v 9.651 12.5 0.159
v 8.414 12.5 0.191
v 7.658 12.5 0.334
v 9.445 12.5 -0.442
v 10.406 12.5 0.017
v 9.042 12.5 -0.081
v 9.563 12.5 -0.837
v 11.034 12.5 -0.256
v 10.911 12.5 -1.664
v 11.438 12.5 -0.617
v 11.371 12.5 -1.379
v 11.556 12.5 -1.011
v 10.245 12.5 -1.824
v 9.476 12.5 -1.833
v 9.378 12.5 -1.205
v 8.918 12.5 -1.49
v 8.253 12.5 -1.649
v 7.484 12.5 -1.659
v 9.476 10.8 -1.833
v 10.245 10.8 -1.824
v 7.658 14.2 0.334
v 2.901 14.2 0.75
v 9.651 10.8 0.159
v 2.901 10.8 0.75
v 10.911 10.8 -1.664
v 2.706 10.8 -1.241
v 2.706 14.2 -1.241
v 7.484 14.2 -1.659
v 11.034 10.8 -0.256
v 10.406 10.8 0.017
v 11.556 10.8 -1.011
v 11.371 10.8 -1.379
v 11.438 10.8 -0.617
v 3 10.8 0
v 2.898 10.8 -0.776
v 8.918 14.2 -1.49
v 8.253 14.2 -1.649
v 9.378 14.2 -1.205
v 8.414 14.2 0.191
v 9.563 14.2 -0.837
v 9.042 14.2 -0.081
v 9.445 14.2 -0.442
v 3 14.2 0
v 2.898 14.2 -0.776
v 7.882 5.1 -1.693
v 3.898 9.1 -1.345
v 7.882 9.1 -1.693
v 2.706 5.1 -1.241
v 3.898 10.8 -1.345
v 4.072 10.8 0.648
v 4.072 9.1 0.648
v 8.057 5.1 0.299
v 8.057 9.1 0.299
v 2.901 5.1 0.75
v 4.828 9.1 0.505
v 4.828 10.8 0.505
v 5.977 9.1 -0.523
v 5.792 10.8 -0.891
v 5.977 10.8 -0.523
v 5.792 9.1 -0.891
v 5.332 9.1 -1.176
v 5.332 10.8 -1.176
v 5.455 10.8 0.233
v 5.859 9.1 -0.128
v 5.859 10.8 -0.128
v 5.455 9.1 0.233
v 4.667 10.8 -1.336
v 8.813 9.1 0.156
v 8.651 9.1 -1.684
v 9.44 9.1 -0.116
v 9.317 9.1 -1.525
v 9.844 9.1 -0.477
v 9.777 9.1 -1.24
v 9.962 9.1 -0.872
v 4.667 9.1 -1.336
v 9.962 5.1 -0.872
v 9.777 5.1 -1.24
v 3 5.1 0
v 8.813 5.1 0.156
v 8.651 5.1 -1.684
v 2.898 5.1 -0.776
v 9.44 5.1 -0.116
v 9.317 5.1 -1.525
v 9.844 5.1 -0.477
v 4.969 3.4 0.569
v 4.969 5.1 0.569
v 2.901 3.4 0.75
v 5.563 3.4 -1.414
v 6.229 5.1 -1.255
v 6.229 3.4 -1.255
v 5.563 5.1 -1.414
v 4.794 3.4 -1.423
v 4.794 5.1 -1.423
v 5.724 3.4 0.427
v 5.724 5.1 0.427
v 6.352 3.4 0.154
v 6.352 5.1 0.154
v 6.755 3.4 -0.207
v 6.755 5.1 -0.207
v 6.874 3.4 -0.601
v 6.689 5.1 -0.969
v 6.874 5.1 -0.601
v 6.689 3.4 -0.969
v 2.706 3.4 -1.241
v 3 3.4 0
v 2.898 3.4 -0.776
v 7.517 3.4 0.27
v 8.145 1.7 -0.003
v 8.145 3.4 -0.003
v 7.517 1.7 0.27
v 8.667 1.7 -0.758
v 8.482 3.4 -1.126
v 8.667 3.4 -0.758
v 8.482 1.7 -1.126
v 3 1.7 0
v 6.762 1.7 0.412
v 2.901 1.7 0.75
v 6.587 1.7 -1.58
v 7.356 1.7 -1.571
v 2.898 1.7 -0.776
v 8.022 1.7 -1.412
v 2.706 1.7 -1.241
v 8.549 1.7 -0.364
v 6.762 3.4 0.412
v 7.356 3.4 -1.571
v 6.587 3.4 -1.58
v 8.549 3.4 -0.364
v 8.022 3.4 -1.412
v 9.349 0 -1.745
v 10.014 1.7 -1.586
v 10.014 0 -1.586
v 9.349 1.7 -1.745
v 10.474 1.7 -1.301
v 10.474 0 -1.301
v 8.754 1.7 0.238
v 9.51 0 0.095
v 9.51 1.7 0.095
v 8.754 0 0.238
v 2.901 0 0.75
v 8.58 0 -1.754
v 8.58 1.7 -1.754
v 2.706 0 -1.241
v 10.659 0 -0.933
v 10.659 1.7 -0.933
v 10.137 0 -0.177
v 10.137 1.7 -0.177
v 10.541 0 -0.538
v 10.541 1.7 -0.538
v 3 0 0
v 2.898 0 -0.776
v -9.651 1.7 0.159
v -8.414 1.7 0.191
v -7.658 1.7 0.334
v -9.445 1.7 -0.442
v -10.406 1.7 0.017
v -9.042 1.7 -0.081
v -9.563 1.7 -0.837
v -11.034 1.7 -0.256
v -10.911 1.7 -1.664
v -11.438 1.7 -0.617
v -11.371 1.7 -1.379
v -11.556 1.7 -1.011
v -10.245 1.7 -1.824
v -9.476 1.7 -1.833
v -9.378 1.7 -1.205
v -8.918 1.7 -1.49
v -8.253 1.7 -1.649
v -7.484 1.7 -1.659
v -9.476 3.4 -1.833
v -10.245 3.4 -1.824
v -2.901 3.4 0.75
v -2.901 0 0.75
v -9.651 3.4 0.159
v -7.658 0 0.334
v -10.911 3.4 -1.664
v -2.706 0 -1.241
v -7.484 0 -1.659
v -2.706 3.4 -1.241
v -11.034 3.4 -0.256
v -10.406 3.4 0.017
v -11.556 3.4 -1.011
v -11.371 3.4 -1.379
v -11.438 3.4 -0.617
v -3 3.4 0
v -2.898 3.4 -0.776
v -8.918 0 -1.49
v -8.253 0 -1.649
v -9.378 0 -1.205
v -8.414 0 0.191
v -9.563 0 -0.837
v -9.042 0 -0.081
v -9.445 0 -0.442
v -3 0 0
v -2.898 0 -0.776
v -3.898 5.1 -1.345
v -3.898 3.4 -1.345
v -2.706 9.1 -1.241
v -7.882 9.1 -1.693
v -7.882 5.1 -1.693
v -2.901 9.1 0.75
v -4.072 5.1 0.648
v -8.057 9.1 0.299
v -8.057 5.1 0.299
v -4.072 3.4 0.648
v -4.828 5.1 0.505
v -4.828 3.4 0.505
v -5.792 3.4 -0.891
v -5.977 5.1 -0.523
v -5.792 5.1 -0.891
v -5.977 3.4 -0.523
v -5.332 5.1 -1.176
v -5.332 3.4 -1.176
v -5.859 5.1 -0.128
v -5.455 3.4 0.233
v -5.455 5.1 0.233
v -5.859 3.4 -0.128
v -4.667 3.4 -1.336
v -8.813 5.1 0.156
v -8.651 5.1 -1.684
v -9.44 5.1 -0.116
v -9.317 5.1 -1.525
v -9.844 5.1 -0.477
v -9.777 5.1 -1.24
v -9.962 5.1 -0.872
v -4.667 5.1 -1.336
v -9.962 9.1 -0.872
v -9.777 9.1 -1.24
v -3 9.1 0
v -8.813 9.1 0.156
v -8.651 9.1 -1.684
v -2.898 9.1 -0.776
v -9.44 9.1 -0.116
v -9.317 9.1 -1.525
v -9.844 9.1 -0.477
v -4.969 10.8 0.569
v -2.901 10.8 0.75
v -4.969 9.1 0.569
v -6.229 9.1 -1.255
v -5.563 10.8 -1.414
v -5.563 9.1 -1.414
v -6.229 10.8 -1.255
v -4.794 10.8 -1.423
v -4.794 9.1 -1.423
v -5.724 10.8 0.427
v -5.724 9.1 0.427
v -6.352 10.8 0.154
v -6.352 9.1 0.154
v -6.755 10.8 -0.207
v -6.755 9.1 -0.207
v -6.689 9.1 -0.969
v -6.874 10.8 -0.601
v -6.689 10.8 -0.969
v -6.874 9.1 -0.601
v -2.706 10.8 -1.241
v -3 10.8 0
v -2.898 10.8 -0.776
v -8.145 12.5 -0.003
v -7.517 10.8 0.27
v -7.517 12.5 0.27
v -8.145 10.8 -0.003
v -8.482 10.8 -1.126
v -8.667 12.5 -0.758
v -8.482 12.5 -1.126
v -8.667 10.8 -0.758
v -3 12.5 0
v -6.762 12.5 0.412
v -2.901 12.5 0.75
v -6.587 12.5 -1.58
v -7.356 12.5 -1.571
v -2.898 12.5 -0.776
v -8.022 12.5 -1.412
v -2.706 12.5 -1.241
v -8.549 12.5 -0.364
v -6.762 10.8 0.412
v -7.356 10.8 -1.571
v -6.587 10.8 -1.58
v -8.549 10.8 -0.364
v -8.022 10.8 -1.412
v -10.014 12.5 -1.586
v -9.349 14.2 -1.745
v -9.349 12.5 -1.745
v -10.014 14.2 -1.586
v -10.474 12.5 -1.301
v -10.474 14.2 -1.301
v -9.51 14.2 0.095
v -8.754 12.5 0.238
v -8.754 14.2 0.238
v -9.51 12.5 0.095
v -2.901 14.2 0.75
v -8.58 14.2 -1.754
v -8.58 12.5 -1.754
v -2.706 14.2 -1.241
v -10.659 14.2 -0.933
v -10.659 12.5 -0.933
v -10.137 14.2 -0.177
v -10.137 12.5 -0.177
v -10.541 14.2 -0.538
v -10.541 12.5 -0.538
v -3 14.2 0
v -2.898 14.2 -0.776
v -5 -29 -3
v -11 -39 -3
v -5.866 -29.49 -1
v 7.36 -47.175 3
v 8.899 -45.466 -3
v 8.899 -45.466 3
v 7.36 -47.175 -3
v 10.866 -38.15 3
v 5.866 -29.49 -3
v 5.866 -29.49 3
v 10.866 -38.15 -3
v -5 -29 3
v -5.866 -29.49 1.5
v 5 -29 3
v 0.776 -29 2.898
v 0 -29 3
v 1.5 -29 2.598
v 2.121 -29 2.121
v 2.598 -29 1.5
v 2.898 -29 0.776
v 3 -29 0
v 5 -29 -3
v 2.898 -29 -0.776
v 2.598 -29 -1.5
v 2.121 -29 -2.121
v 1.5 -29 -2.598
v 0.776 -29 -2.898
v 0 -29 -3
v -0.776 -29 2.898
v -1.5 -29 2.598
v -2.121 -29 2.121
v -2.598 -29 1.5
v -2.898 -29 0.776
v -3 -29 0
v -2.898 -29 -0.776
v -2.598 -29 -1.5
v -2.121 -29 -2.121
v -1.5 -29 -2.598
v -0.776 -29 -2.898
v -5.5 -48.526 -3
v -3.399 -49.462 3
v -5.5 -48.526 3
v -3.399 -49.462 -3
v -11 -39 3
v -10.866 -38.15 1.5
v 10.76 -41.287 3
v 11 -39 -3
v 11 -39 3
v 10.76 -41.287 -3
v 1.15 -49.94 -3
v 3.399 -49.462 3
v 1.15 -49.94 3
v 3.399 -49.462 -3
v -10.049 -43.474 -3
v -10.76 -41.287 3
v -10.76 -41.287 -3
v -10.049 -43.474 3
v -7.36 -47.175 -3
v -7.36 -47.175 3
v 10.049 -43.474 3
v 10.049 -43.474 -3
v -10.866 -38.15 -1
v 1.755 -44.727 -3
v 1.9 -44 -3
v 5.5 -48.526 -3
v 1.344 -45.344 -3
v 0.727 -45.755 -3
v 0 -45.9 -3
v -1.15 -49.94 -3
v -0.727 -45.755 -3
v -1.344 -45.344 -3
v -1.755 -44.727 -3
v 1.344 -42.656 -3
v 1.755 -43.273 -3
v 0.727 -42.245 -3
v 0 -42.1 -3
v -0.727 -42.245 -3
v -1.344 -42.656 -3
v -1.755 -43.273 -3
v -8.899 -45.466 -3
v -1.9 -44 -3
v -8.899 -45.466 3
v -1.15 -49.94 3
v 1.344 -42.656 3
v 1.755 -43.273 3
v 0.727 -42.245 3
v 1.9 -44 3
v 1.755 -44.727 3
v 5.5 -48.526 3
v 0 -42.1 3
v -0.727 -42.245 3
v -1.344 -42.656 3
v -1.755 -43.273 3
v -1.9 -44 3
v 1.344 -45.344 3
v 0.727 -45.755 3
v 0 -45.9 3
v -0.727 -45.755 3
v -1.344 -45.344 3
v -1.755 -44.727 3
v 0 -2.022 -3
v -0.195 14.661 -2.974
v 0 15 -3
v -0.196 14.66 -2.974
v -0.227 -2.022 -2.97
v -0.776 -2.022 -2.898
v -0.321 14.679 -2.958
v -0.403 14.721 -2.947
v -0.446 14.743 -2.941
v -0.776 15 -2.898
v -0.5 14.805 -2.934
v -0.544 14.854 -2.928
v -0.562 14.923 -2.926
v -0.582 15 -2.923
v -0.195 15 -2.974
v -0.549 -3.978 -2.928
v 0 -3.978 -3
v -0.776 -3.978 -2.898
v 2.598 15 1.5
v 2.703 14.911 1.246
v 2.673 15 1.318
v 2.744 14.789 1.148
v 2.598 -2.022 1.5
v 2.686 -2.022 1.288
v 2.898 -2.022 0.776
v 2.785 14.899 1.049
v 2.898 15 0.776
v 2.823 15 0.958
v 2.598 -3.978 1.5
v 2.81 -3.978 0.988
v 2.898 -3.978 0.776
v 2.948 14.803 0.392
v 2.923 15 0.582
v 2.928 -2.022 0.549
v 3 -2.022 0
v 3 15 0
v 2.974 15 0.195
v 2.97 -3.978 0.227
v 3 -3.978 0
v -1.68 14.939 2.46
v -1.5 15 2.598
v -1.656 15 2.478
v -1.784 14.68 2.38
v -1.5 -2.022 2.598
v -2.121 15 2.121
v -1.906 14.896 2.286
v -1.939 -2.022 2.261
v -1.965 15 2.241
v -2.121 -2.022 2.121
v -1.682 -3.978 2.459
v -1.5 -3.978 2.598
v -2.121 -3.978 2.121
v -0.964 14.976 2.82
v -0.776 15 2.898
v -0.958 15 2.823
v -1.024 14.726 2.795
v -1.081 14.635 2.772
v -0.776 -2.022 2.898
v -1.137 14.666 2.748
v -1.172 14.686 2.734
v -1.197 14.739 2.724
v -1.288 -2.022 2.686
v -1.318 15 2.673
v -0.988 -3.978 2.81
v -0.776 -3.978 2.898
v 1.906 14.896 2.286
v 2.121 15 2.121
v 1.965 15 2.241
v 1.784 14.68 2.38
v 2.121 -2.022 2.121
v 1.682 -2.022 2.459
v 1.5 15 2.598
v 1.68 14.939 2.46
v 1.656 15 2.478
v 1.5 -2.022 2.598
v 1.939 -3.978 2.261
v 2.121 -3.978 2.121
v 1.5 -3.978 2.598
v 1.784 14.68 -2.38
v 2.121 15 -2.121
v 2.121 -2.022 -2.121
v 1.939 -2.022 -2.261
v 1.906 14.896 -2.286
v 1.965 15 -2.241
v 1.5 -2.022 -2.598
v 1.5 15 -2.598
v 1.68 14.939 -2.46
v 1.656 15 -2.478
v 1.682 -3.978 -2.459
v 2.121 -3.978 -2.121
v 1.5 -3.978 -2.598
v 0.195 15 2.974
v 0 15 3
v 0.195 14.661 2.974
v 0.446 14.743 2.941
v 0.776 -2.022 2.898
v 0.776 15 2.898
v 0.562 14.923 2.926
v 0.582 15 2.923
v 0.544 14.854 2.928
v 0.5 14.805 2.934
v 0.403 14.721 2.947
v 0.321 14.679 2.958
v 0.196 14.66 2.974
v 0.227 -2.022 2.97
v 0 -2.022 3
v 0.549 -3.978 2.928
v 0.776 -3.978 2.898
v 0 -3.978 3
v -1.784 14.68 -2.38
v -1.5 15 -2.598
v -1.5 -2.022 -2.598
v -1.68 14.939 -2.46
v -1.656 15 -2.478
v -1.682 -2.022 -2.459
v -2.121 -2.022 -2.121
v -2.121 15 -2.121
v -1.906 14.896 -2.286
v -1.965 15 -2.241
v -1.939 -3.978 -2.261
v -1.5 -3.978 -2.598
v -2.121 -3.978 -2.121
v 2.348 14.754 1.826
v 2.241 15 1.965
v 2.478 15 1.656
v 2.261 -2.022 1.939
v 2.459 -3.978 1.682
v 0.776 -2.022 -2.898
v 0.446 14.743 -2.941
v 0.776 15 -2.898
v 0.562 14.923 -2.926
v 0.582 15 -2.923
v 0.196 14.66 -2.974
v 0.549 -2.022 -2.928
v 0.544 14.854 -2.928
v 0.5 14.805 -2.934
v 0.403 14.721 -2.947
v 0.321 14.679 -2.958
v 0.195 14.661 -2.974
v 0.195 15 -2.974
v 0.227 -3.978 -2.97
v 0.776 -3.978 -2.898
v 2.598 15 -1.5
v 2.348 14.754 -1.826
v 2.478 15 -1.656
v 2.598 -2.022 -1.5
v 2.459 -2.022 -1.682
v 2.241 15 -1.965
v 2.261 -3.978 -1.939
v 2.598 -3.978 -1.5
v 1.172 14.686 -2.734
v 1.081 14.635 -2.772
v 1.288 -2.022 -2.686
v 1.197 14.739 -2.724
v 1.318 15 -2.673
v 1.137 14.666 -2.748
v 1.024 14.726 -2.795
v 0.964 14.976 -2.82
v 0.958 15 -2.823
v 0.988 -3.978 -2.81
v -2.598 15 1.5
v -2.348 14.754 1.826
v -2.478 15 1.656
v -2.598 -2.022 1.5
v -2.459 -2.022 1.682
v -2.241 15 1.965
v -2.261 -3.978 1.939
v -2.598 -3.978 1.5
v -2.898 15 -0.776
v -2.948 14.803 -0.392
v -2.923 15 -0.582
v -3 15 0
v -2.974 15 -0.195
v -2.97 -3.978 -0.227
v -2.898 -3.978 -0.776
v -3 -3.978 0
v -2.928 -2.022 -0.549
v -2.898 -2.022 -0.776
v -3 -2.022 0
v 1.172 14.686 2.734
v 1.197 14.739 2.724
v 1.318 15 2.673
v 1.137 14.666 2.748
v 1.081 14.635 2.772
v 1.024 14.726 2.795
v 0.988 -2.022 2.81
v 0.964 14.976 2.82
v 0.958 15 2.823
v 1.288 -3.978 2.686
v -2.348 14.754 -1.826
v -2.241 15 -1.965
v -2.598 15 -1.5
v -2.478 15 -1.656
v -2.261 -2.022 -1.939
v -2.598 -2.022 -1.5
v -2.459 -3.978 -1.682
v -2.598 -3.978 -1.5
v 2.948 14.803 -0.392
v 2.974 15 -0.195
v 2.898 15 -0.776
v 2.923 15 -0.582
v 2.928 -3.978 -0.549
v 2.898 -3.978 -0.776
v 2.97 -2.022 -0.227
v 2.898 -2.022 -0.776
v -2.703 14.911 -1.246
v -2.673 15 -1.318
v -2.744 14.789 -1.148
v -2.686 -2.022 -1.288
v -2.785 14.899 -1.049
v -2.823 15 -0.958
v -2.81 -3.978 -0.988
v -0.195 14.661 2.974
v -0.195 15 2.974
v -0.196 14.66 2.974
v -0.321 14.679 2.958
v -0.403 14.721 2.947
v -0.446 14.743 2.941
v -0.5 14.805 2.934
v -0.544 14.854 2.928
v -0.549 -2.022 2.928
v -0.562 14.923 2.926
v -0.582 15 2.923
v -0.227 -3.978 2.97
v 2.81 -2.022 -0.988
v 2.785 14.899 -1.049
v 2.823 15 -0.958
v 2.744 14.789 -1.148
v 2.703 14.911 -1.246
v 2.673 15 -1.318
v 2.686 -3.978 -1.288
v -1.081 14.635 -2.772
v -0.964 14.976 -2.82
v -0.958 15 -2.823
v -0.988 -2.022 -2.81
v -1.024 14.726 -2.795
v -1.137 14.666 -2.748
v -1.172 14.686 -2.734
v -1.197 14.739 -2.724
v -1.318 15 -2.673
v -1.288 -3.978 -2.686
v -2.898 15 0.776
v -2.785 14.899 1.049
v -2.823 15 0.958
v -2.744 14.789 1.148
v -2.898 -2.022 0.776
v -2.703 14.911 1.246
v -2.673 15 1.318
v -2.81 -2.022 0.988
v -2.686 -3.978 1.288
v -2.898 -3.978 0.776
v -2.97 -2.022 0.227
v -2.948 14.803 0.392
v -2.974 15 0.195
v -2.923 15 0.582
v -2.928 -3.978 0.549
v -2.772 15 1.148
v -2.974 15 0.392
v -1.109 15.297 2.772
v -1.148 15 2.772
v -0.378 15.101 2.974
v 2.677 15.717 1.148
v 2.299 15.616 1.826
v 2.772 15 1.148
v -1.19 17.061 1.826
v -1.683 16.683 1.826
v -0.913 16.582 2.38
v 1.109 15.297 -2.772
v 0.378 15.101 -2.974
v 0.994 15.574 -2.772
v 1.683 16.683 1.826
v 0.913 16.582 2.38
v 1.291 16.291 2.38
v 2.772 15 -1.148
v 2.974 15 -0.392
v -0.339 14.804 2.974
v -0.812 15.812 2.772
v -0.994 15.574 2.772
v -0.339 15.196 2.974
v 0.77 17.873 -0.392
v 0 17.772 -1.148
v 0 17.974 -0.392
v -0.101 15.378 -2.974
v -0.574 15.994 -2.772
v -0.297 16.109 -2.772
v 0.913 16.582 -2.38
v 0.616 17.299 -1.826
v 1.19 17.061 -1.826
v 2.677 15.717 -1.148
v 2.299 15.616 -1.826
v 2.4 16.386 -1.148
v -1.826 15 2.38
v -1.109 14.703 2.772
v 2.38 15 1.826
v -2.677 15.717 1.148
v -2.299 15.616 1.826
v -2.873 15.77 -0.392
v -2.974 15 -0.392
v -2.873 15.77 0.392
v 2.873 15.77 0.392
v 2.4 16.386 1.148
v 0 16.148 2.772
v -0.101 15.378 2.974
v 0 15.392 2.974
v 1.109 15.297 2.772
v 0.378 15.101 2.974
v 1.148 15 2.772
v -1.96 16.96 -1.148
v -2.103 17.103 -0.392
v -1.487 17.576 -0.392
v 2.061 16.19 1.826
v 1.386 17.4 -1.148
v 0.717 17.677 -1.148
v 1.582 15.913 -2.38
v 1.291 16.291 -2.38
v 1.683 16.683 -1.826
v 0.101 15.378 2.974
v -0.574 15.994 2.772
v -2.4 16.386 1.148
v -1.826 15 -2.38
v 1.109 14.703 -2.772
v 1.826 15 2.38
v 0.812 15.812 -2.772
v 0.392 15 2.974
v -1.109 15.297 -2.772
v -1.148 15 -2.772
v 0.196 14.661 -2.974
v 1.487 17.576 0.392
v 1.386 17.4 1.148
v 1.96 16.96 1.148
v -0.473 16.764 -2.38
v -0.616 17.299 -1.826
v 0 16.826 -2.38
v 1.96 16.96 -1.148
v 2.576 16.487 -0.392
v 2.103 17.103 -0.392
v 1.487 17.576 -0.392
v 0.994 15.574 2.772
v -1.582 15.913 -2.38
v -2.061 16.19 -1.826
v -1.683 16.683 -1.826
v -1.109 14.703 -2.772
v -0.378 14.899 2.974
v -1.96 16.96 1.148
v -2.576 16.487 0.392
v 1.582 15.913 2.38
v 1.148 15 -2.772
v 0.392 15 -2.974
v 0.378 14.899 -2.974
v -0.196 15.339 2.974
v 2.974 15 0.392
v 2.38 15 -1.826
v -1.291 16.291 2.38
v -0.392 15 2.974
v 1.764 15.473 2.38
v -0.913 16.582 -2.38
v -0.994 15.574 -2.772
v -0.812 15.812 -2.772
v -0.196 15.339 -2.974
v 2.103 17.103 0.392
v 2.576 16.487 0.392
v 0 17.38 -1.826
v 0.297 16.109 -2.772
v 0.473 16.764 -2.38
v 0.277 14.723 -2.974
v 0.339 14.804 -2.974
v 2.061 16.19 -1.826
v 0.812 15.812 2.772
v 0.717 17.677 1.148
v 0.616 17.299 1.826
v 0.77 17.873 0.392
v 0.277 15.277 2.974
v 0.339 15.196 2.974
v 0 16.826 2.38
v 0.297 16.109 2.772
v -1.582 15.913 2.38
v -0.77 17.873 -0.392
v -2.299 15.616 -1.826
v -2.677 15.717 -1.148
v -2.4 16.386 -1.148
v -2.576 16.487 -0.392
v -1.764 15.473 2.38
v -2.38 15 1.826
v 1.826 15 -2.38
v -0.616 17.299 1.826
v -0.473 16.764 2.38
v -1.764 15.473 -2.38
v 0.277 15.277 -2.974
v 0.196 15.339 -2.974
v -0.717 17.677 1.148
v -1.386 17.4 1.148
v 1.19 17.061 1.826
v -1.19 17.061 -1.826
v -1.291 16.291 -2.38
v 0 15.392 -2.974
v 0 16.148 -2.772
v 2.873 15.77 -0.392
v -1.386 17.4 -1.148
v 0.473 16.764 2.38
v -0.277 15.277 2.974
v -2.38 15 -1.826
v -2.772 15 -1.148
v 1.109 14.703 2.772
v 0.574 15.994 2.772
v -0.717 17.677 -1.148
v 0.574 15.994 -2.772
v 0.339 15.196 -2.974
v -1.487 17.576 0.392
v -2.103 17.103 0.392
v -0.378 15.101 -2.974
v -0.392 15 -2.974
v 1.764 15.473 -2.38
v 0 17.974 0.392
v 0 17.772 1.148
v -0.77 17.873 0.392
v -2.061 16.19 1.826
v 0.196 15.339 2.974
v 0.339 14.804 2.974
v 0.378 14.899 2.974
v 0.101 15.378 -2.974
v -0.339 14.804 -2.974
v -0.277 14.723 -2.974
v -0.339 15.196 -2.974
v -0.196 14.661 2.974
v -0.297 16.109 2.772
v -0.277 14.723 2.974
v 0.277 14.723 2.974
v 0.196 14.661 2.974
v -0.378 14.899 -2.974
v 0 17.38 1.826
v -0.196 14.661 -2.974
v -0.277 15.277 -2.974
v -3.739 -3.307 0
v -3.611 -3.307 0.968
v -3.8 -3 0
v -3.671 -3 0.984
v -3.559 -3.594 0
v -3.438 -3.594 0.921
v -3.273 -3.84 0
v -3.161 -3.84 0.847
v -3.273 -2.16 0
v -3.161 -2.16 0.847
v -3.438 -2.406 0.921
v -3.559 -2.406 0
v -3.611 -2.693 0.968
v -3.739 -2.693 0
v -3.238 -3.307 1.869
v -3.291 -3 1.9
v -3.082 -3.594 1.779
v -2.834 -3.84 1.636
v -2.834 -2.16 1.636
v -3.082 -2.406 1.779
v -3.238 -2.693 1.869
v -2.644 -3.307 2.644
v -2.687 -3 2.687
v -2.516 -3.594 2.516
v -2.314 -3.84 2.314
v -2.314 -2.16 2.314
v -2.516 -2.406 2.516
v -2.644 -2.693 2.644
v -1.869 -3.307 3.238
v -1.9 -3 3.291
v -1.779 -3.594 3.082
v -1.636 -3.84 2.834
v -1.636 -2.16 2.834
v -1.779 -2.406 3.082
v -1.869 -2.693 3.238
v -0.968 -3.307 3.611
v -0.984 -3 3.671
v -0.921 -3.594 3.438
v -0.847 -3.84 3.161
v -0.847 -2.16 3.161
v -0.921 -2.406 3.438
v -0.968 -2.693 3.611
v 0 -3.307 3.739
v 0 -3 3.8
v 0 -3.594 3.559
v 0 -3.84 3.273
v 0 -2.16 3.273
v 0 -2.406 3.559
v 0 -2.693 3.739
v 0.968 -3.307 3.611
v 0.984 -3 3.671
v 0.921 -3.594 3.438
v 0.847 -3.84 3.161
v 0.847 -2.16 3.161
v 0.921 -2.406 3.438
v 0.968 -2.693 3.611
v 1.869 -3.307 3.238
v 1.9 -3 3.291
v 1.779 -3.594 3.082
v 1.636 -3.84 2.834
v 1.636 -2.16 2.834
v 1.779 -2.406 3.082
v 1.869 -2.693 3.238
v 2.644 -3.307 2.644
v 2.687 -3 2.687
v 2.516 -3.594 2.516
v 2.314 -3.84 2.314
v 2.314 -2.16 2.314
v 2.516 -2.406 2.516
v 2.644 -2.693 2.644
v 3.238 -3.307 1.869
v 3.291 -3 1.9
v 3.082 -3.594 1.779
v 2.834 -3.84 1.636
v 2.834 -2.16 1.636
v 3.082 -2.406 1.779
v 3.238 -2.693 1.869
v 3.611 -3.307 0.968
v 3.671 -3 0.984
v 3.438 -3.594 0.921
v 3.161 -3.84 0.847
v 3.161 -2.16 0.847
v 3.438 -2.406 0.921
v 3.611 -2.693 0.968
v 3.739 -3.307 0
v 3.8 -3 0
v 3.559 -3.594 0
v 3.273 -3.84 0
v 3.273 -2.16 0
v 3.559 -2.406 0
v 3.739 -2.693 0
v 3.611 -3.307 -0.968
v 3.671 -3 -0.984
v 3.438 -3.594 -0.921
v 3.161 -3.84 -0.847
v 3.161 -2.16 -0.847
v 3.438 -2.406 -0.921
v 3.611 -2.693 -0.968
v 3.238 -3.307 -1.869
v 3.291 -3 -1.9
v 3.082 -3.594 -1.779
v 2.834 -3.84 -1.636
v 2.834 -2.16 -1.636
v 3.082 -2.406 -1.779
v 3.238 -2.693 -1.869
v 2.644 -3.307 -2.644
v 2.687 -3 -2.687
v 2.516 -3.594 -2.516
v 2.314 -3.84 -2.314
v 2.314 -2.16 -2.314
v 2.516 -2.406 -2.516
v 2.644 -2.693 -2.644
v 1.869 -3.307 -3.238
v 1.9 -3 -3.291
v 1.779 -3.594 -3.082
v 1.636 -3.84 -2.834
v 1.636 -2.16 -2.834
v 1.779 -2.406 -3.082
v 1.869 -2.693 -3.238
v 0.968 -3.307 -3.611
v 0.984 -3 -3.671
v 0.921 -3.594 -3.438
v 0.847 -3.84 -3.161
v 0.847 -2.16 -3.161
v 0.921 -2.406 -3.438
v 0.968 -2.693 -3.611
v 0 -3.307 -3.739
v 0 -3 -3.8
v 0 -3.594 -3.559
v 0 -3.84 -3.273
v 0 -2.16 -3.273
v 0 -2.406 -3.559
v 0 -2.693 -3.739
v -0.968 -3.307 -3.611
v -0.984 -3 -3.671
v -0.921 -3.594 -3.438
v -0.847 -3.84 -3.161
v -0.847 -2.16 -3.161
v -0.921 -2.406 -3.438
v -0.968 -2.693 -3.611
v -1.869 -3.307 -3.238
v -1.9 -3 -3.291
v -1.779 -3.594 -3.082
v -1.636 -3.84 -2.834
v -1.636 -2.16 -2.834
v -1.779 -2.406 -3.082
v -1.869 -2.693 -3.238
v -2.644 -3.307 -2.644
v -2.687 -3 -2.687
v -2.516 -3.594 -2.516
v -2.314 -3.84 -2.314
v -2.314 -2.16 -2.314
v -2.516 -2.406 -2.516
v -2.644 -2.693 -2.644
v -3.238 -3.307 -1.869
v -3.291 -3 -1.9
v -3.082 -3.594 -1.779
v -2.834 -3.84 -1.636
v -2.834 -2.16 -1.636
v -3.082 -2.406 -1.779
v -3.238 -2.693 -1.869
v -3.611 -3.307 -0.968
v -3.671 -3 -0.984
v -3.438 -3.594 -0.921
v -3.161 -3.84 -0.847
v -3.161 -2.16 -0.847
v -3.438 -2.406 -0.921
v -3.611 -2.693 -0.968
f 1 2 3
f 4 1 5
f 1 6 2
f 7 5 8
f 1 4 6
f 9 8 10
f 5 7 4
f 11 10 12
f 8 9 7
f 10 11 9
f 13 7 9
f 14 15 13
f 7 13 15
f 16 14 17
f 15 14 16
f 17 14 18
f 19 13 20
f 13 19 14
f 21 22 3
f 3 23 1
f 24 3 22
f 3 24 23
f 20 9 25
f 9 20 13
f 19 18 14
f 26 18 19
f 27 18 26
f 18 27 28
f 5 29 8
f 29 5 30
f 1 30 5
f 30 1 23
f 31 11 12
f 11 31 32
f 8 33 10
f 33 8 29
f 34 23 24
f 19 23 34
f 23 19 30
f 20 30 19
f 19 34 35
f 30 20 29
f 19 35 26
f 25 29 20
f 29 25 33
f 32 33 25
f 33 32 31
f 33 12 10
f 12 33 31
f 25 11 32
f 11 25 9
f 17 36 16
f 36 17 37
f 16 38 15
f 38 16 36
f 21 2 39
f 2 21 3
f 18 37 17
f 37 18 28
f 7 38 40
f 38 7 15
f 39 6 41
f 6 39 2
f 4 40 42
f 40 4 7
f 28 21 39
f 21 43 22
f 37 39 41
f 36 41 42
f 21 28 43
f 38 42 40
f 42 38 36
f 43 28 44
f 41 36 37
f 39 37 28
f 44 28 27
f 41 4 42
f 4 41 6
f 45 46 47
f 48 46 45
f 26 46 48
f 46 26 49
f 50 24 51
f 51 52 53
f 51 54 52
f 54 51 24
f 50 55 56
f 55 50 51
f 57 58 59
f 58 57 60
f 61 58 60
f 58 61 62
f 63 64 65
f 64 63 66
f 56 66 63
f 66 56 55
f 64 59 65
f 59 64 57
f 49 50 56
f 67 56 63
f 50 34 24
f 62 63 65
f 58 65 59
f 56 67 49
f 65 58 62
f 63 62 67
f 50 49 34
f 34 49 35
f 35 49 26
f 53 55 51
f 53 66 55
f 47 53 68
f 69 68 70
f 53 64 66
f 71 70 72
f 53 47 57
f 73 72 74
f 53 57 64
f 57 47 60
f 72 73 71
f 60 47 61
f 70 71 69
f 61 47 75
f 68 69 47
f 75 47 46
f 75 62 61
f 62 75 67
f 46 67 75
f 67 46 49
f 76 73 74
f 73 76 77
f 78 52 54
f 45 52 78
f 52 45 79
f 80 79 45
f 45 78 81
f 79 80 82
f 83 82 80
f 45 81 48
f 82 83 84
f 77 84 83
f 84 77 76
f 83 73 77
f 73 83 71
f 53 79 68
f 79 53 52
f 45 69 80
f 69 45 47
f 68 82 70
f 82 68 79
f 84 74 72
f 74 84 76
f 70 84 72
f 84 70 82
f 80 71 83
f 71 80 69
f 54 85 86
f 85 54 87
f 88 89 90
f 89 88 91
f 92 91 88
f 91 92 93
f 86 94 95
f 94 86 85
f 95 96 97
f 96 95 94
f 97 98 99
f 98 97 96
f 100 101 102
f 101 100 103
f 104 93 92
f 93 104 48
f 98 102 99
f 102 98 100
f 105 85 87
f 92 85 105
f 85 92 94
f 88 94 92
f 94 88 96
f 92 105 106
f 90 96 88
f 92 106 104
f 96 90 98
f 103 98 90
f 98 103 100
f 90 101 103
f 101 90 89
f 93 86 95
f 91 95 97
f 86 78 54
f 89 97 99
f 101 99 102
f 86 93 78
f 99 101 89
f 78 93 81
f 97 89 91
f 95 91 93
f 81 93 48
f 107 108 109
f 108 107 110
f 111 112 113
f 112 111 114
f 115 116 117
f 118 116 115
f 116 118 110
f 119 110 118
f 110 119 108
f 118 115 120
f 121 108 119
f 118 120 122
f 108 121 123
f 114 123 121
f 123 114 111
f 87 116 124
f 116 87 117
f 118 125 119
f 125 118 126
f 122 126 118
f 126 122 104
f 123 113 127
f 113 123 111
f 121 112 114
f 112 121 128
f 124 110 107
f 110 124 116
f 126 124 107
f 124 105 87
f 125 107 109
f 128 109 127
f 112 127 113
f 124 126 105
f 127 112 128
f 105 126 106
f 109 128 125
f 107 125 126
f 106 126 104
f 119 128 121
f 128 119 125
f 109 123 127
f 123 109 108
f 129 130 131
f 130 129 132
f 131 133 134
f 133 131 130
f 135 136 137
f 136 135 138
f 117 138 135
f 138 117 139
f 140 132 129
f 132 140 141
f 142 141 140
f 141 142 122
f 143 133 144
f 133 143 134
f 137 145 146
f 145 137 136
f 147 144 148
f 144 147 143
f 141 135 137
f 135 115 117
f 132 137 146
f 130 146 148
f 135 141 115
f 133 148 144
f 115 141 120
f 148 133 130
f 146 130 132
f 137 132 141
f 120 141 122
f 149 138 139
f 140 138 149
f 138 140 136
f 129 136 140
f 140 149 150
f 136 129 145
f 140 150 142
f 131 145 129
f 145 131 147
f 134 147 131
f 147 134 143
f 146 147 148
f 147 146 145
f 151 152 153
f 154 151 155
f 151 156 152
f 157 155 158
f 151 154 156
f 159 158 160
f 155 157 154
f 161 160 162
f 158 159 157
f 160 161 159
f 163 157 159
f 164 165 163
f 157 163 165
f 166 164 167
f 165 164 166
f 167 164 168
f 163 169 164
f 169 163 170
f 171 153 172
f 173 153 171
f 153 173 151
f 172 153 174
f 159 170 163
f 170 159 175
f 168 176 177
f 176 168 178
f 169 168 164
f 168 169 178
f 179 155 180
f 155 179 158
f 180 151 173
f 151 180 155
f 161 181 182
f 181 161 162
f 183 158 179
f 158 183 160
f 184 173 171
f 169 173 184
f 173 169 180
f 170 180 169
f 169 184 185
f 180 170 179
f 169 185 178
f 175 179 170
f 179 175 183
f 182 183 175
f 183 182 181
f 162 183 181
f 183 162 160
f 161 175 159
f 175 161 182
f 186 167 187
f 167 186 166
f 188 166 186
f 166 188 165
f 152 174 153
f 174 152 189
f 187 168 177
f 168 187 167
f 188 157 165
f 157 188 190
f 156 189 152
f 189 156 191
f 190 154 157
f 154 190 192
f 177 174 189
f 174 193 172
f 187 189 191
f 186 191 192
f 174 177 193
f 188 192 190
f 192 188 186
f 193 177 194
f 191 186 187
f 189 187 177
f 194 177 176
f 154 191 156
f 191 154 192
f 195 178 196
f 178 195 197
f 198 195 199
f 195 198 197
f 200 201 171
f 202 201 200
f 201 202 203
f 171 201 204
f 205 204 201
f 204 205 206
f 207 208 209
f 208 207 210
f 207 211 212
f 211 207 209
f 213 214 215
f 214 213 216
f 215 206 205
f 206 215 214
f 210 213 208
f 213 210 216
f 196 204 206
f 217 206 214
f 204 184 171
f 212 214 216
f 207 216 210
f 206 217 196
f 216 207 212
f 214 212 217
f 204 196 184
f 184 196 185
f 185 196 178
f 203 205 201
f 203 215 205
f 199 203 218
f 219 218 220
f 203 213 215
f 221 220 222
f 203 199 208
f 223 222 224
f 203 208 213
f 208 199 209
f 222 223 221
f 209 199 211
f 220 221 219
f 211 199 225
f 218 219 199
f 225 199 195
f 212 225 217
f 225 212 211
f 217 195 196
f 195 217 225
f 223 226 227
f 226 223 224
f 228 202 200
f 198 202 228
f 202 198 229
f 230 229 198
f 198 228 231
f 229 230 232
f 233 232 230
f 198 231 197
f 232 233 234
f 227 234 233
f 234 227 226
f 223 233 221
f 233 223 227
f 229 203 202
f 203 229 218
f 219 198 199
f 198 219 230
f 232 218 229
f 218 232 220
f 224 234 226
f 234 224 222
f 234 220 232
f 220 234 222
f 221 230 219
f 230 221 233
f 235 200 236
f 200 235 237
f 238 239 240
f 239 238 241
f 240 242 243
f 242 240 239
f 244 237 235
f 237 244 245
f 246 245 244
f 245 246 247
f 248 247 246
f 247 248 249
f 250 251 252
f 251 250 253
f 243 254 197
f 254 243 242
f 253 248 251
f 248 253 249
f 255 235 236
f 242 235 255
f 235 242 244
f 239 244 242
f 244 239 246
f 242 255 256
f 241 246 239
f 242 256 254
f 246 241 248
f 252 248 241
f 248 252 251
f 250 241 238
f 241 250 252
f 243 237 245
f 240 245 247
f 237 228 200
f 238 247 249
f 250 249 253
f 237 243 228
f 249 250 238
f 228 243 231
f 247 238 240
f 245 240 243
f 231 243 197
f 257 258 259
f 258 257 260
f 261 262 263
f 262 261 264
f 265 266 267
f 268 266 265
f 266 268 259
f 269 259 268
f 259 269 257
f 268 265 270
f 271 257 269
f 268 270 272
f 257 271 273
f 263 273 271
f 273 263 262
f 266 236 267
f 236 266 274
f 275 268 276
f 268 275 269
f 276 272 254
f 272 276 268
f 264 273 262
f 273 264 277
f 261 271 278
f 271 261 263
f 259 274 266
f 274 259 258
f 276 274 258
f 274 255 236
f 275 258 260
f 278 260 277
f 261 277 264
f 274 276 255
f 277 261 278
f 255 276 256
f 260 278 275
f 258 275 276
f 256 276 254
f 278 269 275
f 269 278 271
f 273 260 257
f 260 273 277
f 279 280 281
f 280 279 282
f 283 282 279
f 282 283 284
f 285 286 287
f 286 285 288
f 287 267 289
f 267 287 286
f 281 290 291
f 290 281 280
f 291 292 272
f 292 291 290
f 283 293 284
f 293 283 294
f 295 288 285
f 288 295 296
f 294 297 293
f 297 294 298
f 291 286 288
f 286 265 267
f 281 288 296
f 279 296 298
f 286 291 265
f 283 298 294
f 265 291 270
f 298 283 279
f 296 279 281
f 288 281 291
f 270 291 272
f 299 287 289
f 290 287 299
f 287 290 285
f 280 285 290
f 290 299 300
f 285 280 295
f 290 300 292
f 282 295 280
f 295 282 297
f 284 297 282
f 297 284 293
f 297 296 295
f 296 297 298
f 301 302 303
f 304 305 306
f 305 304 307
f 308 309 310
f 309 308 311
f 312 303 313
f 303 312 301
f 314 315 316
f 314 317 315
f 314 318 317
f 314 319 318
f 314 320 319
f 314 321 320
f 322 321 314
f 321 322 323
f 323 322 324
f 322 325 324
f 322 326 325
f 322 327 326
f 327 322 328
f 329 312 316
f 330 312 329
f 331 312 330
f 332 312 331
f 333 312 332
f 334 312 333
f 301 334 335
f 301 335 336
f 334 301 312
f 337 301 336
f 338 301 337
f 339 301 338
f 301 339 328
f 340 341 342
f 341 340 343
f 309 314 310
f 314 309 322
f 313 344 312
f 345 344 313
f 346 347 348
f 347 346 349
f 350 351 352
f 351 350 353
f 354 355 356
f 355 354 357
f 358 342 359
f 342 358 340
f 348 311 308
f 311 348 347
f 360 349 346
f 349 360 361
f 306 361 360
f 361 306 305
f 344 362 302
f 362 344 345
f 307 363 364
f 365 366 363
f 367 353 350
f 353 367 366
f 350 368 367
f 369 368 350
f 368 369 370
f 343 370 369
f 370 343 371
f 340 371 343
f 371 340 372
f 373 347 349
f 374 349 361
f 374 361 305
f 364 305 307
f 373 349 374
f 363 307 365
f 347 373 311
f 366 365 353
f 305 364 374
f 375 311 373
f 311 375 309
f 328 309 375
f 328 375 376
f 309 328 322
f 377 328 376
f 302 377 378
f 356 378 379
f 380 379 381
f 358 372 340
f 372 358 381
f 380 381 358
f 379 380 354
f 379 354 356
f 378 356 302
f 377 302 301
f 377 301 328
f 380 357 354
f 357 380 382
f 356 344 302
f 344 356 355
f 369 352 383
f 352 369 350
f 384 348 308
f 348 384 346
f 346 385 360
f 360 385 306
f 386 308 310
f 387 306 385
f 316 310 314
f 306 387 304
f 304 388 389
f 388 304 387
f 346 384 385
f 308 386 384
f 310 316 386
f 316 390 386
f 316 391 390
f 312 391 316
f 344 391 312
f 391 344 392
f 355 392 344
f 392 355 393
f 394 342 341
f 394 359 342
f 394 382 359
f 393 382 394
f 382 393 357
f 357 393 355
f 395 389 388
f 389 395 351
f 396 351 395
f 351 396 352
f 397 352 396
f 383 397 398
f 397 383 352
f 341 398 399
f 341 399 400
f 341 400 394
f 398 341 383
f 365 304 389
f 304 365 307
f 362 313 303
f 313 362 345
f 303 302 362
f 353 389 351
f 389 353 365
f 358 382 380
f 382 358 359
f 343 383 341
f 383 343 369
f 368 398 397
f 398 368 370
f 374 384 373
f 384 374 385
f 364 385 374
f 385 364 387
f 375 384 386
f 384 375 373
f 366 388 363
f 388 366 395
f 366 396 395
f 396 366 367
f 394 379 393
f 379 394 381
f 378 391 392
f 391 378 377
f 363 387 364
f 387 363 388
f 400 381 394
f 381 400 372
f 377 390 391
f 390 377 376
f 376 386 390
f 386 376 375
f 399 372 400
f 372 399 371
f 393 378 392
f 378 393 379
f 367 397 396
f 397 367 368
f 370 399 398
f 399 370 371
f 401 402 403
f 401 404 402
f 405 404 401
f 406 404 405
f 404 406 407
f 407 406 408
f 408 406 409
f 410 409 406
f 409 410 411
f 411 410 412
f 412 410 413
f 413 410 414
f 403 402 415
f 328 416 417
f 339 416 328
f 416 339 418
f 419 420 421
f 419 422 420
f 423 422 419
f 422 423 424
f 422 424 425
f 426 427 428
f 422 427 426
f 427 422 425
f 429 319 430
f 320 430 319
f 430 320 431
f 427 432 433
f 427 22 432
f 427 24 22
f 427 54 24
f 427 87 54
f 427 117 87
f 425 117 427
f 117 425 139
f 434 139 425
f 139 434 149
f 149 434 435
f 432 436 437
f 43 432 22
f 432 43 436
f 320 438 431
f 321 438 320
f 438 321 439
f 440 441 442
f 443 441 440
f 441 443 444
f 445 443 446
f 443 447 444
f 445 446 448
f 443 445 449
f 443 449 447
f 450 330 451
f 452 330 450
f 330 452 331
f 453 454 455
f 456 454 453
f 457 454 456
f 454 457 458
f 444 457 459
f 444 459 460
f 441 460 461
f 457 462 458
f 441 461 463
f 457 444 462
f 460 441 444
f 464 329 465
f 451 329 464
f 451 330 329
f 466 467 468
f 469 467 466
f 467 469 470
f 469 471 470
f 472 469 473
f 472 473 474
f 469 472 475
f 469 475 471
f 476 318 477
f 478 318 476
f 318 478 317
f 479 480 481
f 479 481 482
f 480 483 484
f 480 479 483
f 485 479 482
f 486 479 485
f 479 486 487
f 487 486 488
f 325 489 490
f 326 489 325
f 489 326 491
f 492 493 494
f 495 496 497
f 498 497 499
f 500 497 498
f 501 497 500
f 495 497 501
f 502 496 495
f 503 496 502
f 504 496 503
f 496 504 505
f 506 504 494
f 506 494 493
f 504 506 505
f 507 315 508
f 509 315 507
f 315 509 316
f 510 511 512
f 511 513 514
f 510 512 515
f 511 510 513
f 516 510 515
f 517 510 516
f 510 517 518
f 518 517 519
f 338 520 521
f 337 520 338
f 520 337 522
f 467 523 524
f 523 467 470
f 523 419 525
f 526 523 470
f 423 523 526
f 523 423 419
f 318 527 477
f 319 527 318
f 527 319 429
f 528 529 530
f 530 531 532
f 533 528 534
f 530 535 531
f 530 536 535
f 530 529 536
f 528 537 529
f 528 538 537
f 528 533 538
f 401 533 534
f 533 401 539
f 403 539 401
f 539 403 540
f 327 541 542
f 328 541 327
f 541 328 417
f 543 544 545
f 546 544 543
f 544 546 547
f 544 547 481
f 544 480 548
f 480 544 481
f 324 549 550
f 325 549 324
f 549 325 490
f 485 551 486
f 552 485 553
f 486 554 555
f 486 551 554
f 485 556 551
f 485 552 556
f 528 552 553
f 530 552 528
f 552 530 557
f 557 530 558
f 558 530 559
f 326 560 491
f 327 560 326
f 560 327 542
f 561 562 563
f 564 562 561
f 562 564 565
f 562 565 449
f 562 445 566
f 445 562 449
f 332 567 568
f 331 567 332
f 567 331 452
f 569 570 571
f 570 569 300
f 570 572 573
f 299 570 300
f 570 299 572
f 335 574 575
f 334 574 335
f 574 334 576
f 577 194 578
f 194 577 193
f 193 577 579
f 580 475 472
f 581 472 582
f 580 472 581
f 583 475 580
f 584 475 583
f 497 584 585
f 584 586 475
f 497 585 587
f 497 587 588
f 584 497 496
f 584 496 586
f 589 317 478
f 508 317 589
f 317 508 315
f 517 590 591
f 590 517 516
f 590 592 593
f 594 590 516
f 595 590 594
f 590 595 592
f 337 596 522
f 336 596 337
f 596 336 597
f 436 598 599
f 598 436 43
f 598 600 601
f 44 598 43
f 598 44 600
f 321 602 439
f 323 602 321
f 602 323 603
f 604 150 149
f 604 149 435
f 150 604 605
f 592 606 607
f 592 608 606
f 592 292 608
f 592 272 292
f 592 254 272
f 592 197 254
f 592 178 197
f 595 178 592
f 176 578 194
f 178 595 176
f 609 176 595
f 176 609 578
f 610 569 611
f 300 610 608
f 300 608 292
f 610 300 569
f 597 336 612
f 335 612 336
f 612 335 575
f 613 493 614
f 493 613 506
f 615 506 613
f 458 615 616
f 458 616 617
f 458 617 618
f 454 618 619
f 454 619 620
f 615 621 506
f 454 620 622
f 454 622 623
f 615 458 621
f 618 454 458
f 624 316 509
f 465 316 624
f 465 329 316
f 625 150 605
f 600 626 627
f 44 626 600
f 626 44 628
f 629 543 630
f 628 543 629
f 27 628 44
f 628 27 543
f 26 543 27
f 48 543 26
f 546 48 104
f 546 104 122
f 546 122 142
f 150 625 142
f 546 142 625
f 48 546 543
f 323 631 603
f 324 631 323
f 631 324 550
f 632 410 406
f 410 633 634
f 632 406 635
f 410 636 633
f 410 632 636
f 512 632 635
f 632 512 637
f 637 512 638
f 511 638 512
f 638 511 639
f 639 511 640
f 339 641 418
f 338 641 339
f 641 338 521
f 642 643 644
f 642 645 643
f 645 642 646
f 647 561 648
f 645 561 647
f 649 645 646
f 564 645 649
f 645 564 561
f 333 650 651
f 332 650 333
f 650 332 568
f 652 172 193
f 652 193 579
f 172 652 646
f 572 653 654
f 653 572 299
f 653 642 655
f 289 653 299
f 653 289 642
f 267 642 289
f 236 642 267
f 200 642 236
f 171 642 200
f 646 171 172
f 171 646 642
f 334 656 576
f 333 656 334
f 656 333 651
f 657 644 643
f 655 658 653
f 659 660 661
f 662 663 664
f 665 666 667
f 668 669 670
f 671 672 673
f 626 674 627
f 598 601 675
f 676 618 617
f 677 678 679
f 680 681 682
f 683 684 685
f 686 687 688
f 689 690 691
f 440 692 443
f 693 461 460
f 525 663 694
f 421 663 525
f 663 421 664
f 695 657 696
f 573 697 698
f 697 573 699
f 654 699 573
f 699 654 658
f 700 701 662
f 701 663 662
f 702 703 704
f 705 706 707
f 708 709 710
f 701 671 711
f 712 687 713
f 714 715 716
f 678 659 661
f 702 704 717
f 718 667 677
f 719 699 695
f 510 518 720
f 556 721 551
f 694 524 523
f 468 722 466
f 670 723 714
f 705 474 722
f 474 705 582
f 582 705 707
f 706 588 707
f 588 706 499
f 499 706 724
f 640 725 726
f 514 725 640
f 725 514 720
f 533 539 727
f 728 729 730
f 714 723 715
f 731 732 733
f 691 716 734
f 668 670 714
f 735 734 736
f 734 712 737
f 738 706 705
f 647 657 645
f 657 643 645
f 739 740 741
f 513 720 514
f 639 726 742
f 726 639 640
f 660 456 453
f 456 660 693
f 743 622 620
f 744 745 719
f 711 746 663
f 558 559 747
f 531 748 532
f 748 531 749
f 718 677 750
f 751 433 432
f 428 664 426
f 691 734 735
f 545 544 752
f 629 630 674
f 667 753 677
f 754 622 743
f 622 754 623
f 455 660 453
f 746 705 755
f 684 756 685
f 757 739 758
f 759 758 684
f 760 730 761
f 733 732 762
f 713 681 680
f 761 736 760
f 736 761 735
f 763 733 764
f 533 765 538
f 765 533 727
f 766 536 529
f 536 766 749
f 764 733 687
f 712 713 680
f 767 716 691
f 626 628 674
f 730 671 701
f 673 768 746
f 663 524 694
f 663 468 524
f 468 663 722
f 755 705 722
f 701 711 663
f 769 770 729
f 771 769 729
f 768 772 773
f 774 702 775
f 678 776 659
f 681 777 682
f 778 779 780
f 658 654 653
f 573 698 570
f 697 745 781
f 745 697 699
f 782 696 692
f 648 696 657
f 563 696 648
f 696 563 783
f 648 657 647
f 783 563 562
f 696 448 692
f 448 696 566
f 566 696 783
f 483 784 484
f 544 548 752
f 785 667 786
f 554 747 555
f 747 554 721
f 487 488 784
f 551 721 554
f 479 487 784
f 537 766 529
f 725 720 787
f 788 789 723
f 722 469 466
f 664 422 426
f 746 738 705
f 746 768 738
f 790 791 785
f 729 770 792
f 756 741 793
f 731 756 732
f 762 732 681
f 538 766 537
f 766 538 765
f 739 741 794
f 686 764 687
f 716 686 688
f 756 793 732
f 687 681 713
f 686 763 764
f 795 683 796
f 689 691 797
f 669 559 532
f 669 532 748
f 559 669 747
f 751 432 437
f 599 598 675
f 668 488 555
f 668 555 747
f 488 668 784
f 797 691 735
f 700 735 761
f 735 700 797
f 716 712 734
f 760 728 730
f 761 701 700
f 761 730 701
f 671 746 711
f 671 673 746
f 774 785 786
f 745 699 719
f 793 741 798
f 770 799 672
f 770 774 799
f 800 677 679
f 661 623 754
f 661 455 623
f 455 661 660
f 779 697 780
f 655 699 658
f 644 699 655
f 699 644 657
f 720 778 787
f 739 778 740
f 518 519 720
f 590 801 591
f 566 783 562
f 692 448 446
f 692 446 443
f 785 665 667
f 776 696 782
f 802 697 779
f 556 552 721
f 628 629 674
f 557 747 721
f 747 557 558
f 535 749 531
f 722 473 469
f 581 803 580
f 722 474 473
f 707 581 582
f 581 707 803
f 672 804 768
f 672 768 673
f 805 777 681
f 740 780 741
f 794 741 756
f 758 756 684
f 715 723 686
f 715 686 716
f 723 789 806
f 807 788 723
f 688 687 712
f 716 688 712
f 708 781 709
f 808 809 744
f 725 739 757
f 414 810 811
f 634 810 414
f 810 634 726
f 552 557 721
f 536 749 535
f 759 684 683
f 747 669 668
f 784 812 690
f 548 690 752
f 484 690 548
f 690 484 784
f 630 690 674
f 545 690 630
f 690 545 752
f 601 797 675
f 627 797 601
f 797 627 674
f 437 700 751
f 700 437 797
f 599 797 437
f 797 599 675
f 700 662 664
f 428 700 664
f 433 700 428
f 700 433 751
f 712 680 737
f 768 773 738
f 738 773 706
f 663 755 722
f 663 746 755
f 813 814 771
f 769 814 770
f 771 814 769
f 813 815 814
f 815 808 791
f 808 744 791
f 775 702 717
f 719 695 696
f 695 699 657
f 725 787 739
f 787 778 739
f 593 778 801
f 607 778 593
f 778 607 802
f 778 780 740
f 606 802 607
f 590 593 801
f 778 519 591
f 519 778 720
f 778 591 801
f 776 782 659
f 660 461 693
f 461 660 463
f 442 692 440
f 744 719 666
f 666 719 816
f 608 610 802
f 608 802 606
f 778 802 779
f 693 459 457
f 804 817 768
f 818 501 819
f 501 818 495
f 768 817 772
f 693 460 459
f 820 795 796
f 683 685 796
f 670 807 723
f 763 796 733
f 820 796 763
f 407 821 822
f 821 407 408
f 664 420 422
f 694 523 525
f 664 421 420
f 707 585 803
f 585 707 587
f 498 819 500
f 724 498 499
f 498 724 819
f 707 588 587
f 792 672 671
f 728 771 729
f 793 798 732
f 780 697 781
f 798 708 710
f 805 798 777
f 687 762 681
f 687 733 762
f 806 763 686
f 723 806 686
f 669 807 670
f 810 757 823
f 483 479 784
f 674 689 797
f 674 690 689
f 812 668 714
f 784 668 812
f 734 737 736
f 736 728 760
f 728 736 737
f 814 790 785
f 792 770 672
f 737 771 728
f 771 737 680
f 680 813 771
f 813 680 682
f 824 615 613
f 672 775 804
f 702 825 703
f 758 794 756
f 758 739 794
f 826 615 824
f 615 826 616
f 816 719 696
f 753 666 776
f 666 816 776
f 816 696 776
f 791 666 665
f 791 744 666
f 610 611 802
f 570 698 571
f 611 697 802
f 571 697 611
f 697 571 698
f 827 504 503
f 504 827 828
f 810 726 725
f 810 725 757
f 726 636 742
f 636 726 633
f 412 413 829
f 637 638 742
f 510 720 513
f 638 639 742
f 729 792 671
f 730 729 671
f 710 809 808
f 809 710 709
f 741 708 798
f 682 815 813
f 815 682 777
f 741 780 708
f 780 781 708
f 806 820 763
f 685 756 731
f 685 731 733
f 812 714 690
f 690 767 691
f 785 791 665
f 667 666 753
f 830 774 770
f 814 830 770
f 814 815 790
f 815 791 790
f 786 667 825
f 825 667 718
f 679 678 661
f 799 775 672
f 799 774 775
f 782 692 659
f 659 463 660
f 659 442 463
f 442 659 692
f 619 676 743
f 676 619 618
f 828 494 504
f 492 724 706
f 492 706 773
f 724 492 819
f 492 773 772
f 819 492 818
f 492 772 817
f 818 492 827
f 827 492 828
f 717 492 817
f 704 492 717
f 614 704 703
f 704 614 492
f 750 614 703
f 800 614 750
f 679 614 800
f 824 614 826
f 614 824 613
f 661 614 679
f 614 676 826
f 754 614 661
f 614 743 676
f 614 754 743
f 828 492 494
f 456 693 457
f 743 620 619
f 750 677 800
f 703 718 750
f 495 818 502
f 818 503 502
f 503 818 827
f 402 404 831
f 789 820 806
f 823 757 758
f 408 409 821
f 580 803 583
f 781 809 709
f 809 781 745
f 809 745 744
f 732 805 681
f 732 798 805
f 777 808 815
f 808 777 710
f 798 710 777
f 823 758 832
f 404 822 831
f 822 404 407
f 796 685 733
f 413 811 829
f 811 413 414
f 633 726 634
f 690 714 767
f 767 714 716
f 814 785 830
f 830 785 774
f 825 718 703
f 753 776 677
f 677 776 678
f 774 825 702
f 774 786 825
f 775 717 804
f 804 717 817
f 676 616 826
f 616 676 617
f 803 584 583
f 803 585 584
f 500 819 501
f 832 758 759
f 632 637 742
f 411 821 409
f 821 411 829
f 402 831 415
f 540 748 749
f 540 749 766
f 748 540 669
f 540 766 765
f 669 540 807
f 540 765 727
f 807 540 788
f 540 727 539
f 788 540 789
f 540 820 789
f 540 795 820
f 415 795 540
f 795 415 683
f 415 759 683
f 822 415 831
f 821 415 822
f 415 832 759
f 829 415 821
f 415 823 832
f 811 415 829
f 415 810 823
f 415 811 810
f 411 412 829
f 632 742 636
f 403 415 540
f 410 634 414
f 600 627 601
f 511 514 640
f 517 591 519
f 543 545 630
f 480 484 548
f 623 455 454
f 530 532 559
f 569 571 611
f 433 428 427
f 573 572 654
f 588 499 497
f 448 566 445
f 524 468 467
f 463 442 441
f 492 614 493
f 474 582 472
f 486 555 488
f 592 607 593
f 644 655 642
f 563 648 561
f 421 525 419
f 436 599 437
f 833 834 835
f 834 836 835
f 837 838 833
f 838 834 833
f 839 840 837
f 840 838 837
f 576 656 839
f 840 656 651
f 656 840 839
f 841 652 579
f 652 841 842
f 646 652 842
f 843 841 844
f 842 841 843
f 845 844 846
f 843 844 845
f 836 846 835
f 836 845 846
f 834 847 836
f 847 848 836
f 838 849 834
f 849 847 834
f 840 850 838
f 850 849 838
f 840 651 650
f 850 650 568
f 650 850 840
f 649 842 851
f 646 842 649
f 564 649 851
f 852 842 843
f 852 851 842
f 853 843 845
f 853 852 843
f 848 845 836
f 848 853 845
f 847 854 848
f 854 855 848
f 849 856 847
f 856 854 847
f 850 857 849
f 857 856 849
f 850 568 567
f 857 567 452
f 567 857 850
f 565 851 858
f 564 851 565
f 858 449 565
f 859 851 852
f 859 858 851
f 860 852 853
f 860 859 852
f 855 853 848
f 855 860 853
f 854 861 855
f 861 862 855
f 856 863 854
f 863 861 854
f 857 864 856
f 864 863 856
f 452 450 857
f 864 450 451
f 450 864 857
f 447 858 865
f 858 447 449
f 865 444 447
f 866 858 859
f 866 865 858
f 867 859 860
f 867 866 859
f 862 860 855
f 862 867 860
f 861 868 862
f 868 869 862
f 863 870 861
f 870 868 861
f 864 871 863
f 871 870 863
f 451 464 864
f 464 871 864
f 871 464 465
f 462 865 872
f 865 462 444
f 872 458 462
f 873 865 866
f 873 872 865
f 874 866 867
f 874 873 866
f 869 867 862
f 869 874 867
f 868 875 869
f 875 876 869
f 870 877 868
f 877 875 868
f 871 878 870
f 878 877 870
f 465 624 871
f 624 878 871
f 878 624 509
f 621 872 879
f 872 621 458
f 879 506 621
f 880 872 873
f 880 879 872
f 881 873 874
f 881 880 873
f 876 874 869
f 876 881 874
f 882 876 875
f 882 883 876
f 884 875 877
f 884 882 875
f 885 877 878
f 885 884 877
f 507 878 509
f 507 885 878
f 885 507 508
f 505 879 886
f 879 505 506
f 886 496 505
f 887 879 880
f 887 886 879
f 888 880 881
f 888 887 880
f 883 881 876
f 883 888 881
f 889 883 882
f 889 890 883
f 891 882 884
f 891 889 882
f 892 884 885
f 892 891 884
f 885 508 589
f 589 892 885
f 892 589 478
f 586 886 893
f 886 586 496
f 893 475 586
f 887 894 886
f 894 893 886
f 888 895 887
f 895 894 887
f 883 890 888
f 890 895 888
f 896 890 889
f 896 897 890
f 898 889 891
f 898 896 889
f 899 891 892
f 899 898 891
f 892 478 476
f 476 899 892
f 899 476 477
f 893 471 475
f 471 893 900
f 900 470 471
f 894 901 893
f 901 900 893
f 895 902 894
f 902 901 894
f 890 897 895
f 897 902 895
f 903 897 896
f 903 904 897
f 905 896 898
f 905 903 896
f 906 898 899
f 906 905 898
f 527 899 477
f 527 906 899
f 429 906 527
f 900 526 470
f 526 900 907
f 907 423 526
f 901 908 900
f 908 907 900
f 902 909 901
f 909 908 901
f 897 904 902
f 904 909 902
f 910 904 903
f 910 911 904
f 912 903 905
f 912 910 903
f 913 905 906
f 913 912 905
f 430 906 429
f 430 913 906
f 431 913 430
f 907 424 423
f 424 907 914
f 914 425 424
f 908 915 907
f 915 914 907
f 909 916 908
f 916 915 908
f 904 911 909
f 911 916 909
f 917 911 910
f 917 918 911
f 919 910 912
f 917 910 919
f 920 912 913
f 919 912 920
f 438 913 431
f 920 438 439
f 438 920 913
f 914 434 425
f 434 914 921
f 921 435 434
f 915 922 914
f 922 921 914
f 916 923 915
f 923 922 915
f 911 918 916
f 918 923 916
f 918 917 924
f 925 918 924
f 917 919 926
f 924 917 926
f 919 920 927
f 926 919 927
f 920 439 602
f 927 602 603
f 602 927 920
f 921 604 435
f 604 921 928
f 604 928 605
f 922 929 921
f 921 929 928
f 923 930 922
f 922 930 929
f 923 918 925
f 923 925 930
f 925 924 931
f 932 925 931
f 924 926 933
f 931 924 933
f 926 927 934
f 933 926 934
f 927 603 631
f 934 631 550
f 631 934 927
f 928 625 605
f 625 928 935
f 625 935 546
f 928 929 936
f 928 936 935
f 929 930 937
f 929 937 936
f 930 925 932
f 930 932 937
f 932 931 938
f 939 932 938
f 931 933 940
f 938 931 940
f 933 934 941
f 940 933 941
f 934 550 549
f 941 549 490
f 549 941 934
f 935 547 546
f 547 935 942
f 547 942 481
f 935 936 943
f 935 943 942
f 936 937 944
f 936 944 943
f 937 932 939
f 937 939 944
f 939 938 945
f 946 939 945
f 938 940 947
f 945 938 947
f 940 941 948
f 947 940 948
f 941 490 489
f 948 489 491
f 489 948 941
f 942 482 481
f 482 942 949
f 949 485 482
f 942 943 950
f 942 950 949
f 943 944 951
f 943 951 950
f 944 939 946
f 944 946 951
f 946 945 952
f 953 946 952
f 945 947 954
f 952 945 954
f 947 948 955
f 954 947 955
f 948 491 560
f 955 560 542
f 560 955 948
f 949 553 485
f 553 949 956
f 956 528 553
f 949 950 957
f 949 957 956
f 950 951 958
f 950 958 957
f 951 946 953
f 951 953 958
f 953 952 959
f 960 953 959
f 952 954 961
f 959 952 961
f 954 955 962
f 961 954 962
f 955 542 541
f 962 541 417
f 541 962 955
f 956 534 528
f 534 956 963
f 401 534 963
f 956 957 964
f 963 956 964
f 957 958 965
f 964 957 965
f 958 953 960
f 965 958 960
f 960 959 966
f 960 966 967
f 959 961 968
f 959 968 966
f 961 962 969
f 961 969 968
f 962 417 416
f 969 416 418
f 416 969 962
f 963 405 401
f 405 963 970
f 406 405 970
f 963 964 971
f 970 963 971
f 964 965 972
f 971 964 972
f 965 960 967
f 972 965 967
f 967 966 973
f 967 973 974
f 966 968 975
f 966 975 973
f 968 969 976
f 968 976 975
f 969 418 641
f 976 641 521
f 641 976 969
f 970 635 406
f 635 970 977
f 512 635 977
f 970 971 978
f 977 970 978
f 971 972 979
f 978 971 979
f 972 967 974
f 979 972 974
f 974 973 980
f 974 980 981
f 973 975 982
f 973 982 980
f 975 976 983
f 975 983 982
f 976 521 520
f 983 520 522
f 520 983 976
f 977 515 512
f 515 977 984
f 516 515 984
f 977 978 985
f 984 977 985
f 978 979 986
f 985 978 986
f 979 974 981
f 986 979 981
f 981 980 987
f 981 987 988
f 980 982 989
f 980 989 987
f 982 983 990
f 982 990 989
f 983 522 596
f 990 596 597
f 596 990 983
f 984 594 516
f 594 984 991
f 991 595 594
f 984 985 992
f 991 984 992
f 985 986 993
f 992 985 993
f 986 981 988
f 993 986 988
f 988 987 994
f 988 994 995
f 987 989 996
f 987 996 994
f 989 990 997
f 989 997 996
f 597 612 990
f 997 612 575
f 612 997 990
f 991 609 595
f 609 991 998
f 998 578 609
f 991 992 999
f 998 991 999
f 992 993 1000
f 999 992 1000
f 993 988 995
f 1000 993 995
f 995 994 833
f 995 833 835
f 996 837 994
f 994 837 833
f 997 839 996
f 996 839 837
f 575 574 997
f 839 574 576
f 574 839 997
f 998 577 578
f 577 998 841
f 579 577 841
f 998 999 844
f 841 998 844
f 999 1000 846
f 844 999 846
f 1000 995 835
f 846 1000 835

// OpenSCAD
//6 2 5 3 4 1
//1 5 2 4 3 6
p1=9.6;
p2=11.6;
p3=6.0;
p4=6.9;
p5=8.7;
p6=10.7;
centro=10;





rotate([0,5,0])translate([0,0,-1])paletas(p1,p2,p3,p4,p5,p6,centro);



//rotate([0,-5,0])translate([-10,0,-1])
translate([0,14.2,0])rotate([180,-185,])translate([0,0,-1])paletas(p1,p2,p3,p4,p5,p6,centro);

//#cube([19.5,10,1],center=true);

translate([0,-4,0])rotate([90,0,0])cylinder(r=6/2,h=26,$fn=24);
translate([0,15,0])sphere(r=6/2,$fn=24);





translate([0,18-3,0])rotate([90,0,0])cylinder(r=6/2,h=20-3+5,$fn=24);
translate([0,15,0])sphere(r=6/2,$fn=24);

//translate([0,-28,0])sphere(r=4.6/2,$fn=24);

//toroide durante el bracito
translate([0,-3,0])scale([1,0.66,1])rotate([90,0,0])rotate_extrude(convexity = 10, $fn = 24)
translate([2, 0, 0])
circle(r = 3.6/2, $fn = 24);

/////// agarre de arriba
translate([0,20,-1])
difference(){
hull(){

translate([0,-50,0]){
    translate([-10/2,0,0])cube([10,1,2.5]);
    translate([-10,-8.65,0])rotate([0,0,60])cube([10,1,2.5]);
}

translate([0,0,-2])
mirror([1,0,0])
translate([0,-50,0]){
    translate([-10/2,0,0])cube([10,1,6]);
    translate([-10,-8.65,0])rotate([0,0,60])cube([10,1,6]);
}

translate([0,0,-2])
translate([0,-59,0])
difference(){
    cylinder(r=22/2,h=6);
    translate([-20,0,-1])cube([60,50,10]);
}
}
translate([0,-68+4,-10])cylinder(r=3.8/2,h=20,$fn=16);
}

module paletas(p1,p2,p3,p4,p5,p6,centro){
    placas=1.7;
    espacio=4;

    paleta(p6,placas);
    translate([0,placas,0]){
    paleta(p5,placas);
    translate([0,placas,0]){
    paleta(p4,placas);
    translate([0,placas,0]){
    paleta(centro,espacio);
    translate([0,espacio,0]){
    paleta(p3,placas);
    translate([0,placas,0]){
    paleta(p2,placas);
    translate([0,placas,0]){
    paleta(p1,placas);
    }}}}}}
    
}





module paleta(prof,ancho){
    hull(){
        cube([1,ancho,2]);
        translate([prof,0,0])translate([-2,0,1])rotate([-90,0,0])scale([2,1,1])cylinder(r=1,h=ancho,$fn=16);
    }
}
